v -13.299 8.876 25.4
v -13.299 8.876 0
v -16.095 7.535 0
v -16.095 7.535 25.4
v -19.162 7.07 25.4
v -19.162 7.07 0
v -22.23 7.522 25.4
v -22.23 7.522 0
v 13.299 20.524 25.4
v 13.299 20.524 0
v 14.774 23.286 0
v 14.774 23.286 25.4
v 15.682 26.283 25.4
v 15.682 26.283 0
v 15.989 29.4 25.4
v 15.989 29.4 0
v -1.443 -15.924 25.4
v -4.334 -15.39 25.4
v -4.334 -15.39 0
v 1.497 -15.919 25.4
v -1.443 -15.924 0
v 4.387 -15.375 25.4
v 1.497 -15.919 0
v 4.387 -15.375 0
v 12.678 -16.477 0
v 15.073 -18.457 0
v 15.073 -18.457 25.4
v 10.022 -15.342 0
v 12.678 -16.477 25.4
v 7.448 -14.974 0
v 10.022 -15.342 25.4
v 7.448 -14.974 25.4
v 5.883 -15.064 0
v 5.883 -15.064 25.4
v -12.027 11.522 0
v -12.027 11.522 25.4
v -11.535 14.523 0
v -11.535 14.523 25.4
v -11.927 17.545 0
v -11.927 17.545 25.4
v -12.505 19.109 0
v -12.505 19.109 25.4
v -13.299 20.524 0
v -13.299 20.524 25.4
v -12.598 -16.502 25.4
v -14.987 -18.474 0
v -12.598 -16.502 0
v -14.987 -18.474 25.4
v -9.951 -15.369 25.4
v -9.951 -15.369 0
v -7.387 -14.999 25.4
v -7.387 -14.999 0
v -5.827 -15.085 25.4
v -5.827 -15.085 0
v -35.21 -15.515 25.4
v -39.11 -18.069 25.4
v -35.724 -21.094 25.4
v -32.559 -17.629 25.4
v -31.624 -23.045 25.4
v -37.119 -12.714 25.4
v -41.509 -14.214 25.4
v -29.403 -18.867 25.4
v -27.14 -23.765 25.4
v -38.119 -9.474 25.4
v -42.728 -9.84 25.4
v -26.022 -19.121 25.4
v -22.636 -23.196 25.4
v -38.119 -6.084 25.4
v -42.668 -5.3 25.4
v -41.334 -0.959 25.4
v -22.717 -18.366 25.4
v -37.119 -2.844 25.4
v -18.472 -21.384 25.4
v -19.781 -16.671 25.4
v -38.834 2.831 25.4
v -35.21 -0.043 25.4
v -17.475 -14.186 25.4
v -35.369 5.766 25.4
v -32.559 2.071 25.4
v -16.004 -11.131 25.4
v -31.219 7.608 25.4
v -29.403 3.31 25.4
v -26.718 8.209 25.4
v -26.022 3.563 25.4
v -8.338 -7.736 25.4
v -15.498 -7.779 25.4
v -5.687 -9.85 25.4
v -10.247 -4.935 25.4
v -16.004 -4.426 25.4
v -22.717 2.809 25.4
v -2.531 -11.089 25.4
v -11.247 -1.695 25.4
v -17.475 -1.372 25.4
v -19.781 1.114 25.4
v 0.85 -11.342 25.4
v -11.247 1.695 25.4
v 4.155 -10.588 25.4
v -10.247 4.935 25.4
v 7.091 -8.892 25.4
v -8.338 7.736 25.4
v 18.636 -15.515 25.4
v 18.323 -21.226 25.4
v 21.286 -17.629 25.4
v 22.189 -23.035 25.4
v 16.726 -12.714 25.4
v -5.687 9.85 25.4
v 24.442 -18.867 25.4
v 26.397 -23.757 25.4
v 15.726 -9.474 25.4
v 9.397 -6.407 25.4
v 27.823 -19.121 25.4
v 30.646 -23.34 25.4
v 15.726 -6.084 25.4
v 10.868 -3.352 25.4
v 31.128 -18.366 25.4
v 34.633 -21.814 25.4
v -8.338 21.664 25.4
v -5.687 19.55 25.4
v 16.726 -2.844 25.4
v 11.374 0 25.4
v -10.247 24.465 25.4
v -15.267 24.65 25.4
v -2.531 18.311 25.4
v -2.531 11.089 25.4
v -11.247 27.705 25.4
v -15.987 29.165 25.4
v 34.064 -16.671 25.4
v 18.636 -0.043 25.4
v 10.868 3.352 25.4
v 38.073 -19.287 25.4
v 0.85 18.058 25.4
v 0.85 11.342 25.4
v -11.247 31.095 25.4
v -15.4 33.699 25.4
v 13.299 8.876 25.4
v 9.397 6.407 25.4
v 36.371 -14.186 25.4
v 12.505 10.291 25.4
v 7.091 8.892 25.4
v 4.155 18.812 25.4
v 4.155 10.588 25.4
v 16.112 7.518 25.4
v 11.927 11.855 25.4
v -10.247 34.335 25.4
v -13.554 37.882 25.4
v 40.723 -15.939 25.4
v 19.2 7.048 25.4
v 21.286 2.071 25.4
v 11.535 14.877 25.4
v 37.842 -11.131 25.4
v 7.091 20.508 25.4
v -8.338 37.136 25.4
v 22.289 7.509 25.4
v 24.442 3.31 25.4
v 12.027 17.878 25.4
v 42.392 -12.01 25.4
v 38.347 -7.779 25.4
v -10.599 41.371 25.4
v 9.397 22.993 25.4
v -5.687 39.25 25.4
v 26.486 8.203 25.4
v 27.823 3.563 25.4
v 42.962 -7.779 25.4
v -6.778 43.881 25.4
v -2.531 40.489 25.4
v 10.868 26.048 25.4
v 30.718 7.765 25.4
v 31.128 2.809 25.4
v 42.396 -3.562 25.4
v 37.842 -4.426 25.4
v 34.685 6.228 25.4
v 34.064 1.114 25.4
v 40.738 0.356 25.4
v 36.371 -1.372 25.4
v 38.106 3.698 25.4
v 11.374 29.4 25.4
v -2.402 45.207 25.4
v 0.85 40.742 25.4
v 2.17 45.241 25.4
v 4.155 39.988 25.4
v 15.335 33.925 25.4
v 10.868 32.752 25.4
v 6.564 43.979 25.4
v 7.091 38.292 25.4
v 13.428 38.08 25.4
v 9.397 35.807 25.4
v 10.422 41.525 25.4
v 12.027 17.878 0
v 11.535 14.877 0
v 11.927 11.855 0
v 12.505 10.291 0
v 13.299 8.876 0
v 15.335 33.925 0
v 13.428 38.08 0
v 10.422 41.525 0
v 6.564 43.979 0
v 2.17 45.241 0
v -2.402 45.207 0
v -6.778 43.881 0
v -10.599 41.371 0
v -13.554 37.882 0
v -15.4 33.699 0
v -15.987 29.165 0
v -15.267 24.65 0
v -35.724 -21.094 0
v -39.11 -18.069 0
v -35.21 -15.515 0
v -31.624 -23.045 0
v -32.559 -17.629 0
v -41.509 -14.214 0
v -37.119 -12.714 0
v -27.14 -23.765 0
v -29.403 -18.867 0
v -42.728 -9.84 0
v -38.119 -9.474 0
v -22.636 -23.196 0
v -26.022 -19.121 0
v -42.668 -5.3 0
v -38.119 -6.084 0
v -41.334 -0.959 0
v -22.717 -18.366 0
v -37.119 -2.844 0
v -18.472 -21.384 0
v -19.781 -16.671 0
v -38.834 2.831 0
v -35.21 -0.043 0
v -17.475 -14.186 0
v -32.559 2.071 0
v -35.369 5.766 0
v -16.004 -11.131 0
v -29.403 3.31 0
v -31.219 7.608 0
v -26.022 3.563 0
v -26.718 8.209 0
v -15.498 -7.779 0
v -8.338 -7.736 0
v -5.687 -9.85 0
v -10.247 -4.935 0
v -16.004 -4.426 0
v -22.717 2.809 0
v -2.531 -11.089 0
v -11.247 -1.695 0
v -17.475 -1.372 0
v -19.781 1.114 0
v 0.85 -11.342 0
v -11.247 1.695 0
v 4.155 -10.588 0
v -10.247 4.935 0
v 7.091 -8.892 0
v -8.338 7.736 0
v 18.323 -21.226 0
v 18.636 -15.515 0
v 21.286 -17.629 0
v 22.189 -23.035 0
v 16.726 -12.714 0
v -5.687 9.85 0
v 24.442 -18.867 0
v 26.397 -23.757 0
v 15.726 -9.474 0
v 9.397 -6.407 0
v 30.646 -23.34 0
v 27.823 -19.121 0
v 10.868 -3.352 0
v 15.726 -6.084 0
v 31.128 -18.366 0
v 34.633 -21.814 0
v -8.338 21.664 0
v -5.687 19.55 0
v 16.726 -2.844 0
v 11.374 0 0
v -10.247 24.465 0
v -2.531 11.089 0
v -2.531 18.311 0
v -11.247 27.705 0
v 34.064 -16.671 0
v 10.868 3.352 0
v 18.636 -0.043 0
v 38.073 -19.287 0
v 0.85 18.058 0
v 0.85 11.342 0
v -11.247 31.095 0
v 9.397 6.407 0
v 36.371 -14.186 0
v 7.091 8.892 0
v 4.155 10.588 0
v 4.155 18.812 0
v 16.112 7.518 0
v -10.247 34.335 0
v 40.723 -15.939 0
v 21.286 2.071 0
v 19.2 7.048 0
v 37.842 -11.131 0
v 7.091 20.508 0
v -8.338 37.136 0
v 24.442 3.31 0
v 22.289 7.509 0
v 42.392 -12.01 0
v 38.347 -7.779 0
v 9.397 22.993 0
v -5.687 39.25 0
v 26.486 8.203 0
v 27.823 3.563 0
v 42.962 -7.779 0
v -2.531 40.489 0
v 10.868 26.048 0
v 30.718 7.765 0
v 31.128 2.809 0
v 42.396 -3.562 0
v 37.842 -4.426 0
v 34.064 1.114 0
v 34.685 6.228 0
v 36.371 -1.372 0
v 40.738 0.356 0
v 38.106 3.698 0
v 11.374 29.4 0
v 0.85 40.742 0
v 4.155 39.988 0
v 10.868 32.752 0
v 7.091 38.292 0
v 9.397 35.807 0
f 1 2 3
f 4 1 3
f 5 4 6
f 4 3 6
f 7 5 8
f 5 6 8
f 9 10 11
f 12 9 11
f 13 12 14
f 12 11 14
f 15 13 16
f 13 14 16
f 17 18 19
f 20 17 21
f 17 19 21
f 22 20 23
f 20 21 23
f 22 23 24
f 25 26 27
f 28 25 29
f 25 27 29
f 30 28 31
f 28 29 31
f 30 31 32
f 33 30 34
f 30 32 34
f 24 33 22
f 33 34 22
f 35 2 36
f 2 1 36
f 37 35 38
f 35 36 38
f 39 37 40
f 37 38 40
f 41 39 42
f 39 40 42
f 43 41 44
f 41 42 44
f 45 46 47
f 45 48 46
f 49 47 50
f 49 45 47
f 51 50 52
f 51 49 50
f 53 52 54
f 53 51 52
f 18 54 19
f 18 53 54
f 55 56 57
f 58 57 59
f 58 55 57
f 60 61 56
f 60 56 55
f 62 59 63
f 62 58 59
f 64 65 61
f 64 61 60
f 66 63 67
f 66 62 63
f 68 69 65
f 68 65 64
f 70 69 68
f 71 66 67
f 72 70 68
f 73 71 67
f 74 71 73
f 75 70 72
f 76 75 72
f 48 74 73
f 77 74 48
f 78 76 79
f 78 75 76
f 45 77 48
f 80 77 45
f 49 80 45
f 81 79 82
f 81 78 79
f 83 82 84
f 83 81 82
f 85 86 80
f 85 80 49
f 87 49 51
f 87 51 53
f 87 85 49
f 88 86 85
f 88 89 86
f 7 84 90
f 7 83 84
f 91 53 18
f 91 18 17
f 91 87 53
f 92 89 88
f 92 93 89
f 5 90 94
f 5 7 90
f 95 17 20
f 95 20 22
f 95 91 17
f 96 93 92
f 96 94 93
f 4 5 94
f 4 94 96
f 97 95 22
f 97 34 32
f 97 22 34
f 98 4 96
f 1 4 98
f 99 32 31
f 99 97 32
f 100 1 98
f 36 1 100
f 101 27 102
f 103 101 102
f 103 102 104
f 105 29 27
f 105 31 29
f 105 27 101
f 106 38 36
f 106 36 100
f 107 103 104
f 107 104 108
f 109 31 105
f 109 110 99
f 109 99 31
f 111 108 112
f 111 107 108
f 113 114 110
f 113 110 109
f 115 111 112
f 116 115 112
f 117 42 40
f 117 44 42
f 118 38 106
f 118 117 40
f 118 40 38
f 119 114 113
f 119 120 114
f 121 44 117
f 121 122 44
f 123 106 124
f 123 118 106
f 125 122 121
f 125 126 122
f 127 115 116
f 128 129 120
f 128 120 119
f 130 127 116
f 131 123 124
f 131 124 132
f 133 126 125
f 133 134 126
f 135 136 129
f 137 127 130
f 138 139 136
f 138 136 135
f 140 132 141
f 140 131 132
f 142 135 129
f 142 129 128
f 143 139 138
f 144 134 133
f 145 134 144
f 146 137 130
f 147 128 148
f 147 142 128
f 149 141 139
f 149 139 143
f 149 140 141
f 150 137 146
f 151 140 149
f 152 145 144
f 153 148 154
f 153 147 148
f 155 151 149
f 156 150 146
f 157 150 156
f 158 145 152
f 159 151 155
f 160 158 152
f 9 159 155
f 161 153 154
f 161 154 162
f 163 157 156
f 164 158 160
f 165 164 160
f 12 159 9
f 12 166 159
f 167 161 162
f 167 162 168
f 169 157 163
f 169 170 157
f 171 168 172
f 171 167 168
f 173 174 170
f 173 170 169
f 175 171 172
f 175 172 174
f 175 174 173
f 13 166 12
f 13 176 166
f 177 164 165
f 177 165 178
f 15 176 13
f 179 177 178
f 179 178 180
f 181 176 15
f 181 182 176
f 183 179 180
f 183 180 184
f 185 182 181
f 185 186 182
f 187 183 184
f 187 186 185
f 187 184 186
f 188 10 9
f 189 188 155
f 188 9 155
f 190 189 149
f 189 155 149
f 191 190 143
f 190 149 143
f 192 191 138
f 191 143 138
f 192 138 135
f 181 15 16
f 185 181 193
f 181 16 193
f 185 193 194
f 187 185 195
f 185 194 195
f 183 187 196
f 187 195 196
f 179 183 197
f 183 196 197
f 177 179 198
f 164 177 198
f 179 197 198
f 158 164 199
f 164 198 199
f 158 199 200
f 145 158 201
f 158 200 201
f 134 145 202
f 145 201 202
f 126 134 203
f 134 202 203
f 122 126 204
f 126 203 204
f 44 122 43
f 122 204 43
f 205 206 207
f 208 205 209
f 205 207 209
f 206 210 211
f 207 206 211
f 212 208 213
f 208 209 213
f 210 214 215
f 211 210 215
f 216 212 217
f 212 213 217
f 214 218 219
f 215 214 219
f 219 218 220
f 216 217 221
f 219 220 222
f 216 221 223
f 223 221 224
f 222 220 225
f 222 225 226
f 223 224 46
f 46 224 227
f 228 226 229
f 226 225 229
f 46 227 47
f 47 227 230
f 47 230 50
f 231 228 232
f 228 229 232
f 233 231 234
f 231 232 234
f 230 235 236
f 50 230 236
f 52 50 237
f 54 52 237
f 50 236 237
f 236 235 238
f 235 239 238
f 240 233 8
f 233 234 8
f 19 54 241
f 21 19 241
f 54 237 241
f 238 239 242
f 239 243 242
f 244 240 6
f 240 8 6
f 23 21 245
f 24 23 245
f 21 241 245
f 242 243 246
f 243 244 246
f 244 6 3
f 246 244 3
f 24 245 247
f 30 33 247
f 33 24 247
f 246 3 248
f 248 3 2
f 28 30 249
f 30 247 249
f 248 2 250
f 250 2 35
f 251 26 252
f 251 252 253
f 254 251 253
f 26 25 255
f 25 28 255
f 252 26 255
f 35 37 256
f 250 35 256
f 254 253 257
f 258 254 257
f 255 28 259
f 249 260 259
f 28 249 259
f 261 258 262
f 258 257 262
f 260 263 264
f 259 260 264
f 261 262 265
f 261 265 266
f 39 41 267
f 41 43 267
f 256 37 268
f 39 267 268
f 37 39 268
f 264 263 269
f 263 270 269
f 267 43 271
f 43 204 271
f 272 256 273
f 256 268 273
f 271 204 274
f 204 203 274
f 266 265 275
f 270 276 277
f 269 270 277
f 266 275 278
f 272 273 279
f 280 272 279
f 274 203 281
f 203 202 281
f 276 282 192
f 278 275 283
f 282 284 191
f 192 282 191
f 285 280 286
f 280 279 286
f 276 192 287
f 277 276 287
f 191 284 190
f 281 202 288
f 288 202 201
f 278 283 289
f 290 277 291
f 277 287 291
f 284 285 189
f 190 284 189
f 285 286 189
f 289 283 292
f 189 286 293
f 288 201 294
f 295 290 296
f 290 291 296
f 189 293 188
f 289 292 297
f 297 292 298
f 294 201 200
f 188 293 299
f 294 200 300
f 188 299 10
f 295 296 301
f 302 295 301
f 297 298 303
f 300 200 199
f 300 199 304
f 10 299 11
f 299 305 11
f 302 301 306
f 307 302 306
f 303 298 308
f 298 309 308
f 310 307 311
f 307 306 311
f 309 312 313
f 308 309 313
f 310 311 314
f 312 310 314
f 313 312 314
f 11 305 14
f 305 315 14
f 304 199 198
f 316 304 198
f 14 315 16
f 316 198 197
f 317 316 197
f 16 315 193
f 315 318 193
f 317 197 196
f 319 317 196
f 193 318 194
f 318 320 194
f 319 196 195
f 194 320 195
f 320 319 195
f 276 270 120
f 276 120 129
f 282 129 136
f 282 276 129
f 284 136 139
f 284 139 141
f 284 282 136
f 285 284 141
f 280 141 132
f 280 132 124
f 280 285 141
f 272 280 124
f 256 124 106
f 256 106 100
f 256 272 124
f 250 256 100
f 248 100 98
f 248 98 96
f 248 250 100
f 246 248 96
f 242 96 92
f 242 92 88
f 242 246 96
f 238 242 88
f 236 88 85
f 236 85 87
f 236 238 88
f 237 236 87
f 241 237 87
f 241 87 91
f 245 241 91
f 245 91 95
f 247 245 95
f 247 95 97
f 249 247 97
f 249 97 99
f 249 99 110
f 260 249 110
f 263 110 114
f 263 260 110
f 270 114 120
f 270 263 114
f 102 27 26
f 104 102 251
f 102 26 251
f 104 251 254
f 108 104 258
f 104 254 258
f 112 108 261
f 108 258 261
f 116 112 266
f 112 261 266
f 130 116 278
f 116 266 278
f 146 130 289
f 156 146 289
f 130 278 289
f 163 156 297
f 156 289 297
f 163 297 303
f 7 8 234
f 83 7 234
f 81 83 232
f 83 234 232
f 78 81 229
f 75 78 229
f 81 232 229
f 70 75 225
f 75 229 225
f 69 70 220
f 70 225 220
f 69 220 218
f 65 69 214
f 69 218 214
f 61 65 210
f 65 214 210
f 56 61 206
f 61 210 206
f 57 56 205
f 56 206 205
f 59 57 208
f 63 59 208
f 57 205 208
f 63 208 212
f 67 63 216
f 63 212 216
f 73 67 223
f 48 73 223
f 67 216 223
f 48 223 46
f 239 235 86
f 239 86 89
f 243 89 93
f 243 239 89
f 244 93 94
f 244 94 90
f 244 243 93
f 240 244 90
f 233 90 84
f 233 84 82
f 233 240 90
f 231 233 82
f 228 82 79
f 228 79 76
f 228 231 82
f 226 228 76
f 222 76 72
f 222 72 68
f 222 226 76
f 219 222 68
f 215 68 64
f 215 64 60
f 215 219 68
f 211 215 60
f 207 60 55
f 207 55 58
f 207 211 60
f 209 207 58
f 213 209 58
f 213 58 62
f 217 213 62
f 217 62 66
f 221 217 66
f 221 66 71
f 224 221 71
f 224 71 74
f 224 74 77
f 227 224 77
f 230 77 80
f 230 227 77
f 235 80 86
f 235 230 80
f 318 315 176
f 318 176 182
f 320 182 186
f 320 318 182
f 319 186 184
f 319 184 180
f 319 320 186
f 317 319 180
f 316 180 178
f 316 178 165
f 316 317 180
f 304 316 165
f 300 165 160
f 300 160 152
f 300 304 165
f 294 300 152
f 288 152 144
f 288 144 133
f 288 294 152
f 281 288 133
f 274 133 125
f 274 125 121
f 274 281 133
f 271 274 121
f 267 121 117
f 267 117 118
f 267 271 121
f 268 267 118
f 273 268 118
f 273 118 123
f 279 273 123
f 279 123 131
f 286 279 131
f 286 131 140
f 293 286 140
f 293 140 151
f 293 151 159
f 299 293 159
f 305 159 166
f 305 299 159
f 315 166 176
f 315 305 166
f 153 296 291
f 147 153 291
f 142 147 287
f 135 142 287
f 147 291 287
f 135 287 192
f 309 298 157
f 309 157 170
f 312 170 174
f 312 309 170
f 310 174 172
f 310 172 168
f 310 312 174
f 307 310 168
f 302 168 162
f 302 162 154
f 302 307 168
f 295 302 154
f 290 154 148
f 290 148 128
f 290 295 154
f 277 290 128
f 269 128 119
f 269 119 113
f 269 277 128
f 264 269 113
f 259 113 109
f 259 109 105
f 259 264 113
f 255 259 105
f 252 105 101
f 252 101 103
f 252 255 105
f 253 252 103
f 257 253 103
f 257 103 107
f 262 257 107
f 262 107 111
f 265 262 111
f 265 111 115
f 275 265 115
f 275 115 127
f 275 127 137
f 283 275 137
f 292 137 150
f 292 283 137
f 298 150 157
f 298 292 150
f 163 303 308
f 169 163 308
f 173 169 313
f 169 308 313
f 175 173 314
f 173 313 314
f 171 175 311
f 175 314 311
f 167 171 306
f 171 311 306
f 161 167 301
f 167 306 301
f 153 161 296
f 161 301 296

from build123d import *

# Parameters (mm, degrees)
F0_R        = 11.3737467854
F1_DEPTH    = 25.4
F2_R        = 10.5009772193
F3_R        = 10.4902
F4_R        = 10.4902
F5_T1_DEPTH = 25.4
F6_R        = 10.4902
F7_T1_DEPTH = 25.4


# Not quite as in the source:
# - a fillet or chamfer that OpenCascade refuses, or shapes differently, is made with other operations: its cross-section is extruded or revolved along the edge and cut away or added


with BuildPart() as f1:
    # F0 (on Top) → F1 (new body)
    with BuildSketch(Plane.XY):
        with BuildLine():
            ThreePointArc((6.2894283282, 14.6999955177), (13.345564471, 20.5941585441), (15.9889579684, 29.3999910355))
            ThreePointArc((15.9889579684, 29.3999910355), (-8.8058324914, 42.7455555065), (-6.2894283282, 14.6999955177))
            ThreePointArc((-6.2894283282, 14.6999955177), (0, 15.9889579684), (6.2894283282, 14.6999955177))
        make_face()
        with Locations((0, 29.3999910355)):
            Circle(F0_R, mode=Mode.SUBTRACT)
        with BuildLine():
            ThreePointArc((6.2894283282, 14.6999955177), (0, 13.411033067), (-6.2894283282, 14.6999955177))
            ThreePointArc((-6.2894283282, 14.6999955177), (-12.2780666284, 10.2418678368), (-15.5897168926, 3.5507047362))
            ThreePointArc((-15.5897168926, 3.5507047362), (-12.1065325646, -1.6446399909), (-10.8830575897, -7.7787486371))
            ThreePointArc((-10.8830575897, -7.7787486371), (-10.983181349, -9.5652884184), (-11.2822986655, -11.3294533733))
            ThreePointArc((-11.2822986655, -11.3294533733), (0.0583928669, -15.9888513405), (11.3647491723, -11.246744114))
            ThreePointArc((11.3647491723, -11.246744114), (11.6102118149, -3.3482637899), (15.6083251298, 3.467991286))
            ThreePointArc((15.6083251298, 3.467991286), (12.3051770158, 10.209279873), (6.2894283282, 14.6999955177))
        make_face()
        Circle(F0_R, mode=Mode.SUBTRACT)
        with BuildLine():
            ThreePointArc((42.9620322705, -7.778752828), (33.0532173957, 7.0090339191), (15.6083251298, 3.467991286))
            ThreePointArc((15.6083251298, 3.467991286), (15.893514894, 1.7444085615), (15.9889579684, 0))
            ThreePointArc((15.9889579684, 0), (14.7877867471, -6.0801430936), (11.3647491723, -11.246744114))
            ThreePointArc((11.3647491723, -11.246744114), (28.7174828636, -23.6722677221), (42.9620322705, -7.778752828))
        make_face()
        with Locations((26.9730743021, -7.778752828)):
            Circle(F0_R, mode=Mode.SUBTRACT)
        with BuildLine():
            ThreePointArc((-11.2822986655, -11.3294533733), (-15.3584205367, -4.4458627437), (-15.5897168926, 3.5507047362))
            ThreePointArc((-15.5897168926, 3.5507047362), (-42.2304360948, -12.2246113807), (-11.2822986655, -11.3294533733))
        make_face()
        with Locations((-26.8720155582, -7.7787486371)):
            Circle(F0_R, mode=Mode.SUBTRACT)
        with BuildLine():
            ThreePointArc((-10.8830575897, -7.7787486371), (-12.1065325646, -1.6446399909), (-15.5897168926, 3.5507047362))
            ThreePointArc((-15.5897168926, 3.5507047362), (-15.3584205367, -4.4458627437), (-11.2822986655, -11.3294533733))
            ThreePointArc((-11.2822986655, -11.3294533733), (-10.983181349, -9.5652884184), (-10.8830575897, -7.7787486371))
        make_face()
        with BuildLine():
            ThreePointArc((6.2894283282, 14.6999955177), (0, 15.9889579684), (-6.2894283282, 14.6999955177))
            ThreePointArc((-6.2894283282, 14.6999955177), (0, 13.411033067), (6.2894283282, 14.6999955177))
        make_face()
        with BuildLine():
            ThreePointArc((15.9889579684, 0), (15.893514894, 1.7444085615), (15.6083251298, 3.467991286))
            ThreePointArc((15.6083251298, 3.467991286), (11.6102118149, -3.3482637899), (11.3647491723, -11.246744114))
            ThreePointArc((11.3647491723, -11.246744114), (14.7877867471, -6.0801430936), (15.9889579684, 0))
        make_face()
    extrude(amount=F1_DEPTH)

    # F2
    f2_edges = [f1.edges().sort_by_distance(p)[0] for p in [
        (-11.282299, -11.329453, 12.7),
    ]]
    fillet(f2_edges, radius=F2_R)

    # F3
    f3_edges = [f1.edges().sort_by_distance(p)[0] for p in [
        (6.289428, 14.699996, 12.7),
    ]]
    fillet(f3_edges, radius=F3_R)

    # F4
    f4_edges = [f1.edges().sort_by_distance(p)[0] for p in [
        (11.364749, -11.246744, 12.7),
    ]]
    fillet(f4_edges, radius=F4_R)

    # F5: fillet of radius 10.4902 on 1 edges, made by hand

    # F5_s2 → F5_t1 (join)
    with BuildSketch(Plane.XY):
        with BuildLine():
            ThreePointArc((22.2888959377, 7.5086684708), (17.6379410744, 7.1677184148), (13.298783115, 8.8763249477))
            ThreePointArc((13.298783115, 8.8763249477), (14.7043444266, 6.2792540878), (15.6083251298, 3.467991286))
            ThreePointArc((15.6083251298, 3.467991286), (18.6981853725, 5.9023651862), (22.2888959377, 7.5086684708))
        make_face()
    extrude(amount=F5_T1_DEPTH)

    # F6
    f6_edges = [f1.edges().sort_by_distance(p)[0] for p in [
        (-6.289428, 14.699996, 12.7),
    ]]
    fillet(f6_edges, radius=F6_R)

    # F7: fillet of radius 10.4902 on 1 edges, made by hand

    # F7_s2 → F7_t1 (join)
    with BuildSketch(Plane.XY):
        with BuildLine():
            ThreePointArc((-13.298783115, 8.8763249477), (-17.6110780147, 7.1883289802), (-22.2299741232, 7.5215202571))
            ThreePointArc((-22.2299741232, 7.5215202571), (-18.6660423749, 5.9438160297), (-15.5897168926, 3.5507047362))
            ThreePointArc((-15.5897168926, 3.5507047362), (-14.6876450063, 6.3182166063), (-13.298783115, 8.8763249477))
        make_face()
    extrude(amount=F7_T1_DEPTH)


solid = f1.part
